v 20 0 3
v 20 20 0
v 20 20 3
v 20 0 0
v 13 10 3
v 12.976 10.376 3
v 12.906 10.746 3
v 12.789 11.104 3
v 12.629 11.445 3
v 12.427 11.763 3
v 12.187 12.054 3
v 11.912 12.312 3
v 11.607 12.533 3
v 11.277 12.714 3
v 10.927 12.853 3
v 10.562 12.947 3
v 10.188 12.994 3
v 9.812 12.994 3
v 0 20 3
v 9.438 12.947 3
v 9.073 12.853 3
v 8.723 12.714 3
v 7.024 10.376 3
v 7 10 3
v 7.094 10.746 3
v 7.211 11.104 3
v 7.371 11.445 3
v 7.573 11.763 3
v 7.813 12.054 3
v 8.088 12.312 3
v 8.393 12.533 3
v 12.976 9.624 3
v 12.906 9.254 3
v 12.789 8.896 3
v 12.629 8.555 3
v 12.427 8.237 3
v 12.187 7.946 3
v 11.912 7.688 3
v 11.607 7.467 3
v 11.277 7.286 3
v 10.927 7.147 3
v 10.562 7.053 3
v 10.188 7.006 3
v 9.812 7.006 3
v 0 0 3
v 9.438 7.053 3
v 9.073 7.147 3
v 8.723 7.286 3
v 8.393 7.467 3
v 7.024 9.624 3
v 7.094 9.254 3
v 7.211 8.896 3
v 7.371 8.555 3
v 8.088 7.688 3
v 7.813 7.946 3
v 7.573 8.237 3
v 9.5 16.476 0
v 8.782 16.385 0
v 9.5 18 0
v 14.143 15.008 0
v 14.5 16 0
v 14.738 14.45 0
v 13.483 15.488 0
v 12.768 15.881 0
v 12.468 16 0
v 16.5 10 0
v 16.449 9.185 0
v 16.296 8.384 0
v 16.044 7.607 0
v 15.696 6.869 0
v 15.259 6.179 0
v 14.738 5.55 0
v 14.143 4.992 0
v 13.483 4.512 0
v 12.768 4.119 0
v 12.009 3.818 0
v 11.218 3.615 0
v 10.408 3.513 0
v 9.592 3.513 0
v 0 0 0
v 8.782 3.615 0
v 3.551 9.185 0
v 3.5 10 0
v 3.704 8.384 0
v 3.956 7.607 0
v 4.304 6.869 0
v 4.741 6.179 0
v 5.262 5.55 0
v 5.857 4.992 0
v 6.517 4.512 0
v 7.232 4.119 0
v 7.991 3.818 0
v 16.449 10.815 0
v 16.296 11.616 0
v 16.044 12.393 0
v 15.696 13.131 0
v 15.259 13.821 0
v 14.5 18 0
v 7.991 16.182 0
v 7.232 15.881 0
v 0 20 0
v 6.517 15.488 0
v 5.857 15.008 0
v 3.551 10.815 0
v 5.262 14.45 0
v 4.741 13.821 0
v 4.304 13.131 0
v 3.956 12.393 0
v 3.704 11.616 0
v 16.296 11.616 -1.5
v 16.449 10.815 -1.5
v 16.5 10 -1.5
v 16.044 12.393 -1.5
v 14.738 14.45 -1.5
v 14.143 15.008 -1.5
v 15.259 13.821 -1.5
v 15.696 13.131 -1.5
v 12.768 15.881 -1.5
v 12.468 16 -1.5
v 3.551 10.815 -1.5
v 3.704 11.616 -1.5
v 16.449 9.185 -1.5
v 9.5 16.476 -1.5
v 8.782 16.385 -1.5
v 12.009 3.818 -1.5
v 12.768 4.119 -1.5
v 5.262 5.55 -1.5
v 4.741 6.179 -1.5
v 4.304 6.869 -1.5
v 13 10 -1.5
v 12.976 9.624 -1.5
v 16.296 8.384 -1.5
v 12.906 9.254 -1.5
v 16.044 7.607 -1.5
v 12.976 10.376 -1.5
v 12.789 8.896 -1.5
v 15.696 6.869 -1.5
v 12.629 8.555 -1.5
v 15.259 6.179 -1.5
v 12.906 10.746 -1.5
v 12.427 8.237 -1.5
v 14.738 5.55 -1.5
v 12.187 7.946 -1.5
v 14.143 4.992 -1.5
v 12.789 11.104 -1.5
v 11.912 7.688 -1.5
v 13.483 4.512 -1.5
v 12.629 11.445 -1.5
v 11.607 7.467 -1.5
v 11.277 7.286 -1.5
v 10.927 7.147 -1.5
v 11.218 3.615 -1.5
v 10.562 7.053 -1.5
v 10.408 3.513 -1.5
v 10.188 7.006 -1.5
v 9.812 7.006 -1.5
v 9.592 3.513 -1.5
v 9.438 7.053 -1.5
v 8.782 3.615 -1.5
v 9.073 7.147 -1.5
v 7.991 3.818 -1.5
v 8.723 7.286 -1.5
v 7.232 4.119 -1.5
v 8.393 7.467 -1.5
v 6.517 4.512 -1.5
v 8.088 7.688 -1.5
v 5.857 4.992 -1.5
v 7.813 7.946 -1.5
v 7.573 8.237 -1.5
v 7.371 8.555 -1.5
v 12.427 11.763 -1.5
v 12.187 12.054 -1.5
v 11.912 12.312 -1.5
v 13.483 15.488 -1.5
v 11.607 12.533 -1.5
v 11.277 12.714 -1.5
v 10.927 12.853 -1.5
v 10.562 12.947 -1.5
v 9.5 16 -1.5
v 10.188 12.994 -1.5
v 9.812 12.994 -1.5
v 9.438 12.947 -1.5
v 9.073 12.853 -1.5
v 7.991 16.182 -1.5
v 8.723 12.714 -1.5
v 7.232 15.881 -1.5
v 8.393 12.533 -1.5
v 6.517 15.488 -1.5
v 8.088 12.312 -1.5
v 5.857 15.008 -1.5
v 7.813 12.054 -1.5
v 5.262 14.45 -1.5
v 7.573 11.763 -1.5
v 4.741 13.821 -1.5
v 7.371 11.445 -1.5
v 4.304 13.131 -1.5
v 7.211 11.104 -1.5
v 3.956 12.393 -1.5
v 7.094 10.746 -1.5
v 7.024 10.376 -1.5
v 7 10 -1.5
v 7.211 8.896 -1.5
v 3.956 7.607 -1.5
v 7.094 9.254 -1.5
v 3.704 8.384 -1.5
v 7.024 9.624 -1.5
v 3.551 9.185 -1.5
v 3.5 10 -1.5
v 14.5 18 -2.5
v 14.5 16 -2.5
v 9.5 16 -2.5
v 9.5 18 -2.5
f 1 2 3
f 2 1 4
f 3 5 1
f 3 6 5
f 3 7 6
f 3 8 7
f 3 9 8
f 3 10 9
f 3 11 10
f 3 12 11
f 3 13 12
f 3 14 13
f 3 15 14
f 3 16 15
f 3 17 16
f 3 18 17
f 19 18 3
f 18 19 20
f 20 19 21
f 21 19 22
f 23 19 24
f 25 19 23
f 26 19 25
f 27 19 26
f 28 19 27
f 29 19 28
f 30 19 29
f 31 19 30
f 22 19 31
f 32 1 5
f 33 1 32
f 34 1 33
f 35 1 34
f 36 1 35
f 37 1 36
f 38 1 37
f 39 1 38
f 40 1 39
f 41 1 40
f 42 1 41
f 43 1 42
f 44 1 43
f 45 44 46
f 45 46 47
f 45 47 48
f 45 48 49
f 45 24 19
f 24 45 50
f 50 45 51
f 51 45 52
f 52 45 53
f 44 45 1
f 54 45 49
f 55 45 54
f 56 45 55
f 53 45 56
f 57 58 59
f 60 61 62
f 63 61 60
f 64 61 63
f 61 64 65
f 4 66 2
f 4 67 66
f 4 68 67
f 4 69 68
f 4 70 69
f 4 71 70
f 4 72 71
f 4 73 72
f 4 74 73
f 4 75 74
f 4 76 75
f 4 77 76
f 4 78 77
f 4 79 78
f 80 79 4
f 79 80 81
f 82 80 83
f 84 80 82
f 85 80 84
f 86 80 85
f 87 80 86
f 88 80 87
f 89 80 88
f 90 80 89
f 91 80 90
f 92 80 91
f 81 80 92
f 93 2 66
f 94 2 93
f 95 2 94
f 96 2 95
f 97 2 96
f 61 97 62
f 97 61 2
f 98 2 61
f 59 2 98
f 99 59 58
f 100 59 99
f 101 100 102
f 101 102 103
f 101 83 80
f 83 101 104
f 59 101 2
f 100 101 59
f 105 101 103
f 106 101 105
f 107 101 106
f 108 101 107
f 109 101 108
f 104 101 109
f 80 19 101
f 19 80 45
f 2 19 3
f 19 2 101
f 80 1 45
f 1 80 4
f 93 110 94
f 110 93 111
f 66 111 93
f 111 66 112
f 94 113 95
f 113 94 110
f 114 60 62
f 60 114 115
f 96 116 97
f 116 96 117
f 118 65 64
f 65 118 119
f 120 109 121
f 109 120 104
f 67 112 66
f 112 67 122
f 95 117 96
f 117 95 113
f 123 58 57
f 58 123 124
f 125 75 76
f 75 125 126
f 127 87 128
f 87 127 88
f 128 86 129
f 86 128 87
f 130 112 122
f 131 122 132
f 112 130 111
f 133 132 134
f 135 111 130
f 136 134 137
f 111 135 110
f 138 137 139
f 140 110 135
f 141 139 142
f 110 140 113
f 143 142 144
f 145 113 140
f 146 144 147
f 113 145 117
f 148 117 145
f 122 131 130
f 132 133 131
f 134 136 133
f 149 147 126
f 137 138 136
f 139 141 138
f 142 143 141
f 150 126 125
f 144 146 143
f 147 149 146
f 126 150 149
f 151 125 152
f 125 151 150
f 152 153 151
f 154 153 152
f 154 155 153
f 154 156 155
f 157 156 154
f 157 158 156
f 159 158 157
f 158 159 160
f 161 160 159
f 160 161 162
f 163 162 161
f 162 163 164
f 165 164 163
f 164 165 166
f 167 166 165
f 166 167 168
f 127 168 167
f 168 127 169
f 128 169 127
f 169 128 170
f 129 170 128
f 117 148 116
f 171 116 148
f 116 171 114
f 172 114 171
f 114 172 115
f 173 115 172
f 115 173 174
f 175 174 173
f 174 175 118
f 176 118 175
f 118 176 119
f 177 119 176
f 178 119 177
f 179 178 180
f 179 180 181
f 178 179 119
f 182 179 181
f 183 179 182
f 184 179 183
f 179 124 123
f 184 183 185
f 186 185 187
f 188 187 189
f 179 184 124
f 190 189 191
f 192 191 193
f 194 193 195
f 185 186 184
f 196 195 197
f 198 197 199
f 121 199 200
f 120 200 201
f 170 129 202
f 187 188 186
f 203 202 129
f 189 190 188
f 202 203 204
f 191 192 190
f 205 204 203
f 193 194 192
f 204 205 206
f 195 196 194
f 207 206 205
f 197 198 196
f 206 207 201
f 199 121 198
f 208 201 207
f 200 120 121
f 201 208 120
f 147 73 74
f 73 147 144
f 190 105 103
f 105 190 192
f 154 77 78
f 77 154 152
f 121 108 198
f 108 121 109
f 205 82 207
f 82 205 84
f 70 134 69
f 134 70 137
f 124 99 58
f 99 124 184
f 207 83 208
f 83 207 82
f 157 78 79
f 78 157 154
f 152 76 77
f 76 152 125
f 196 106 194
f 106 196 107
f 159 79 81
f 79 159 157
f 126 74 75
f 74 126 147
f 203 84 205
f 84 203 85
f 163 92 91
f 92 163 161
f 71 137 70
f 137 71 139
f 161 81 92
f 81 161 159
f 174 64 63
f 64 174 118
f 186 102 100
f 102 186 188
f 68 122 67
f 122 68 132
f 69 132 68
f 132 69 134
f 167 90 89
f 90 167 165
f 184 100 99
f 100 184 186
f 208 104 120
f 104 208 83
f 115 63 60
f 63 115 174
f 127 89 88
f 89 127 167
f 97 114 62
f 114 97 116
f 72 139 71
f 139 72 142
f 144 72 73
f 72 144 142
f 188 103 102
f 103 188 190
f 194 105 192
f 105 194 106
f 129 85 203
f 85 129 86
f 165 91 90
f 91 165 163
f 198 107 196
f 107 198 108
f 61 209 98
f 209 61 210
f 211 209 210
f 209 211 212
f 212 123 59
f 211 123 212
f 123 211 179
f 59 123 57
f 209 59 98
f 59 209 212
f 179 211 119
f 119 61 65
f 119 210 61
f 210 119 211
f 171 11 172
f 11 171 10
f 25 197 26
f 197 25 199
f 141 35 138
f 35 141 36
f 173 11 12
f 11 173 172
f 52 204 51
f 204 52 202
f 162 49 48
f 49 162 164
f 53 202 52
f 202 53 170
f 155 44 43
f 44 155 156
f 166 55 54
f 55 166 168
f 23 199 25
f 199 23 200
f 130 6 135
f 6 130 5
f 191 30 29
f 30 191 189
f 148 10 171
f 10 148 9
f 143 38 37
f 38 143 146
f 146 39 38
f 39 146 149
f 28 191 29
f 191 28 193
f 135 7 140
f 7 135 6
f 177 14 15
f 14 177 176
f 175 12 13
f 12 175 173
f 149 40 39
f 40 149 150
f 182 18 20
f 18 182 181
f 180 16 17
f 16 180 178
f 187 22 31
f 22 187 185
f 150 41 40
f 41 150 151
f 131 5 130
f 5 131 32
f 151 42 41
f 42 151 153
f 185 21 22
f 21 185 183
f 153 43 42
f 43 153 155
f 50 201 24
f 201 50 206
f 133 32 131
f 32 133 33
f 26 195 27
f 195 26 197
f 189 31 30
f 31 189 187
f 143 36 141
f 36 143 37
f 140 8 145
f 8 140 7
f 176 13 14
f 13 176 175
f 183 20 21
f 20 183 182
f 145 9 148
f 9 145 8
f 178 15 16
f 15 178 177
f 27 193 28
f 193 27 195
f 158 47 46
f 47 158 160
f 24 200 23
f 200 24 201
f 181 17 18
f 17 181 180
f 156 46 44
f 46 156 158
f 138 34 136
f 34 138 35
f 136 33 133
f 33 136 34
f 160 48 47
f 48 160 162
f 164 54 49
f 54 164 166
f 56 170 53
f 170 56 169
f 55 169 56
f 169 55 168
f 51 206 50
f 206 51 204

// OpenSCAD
$fn = 50;

/**
 * A component to hold a MTS switch.  (eg: MTS-103)
 *
 * @param width        width of the component surface (x-axis)
 * @param length       length of the component surface (y-axis)
 * @param height       height of the component surface (z-axis)
 */
module mts(width, length, height) {
  translate([width / 2, length / 2, height / 2]) {
    difference() {
      hole_radius = 3.0;
      sleve_height = 4.5;
      sleve_radius = 6.5;

      union() {
        // surface
        cube([width, length, height], true);
        // sleve
        translate([0, 0, (sleve_height - height) / -2])
          cylinder(h = sleve_height, r = sleve_radius, center = true);
        // tab
        tab_width = 5.0;
        tab_length = 2.0;
        tab_height = sleve_height + 1.0;
        tab_offset = 0.5;
        translate([(tab_width / 2) - tab_offset, 6.0 + (tab_length / 2), (tab_height - height) / -2])
          cube([tab_width, tab_length, tab_height], center = true);
      }

      // hole
      cylinder(h = 7, r = hole_radius, center = true);
    }
  }
}

// Test the component
rows = 1;
columns = 1;

component_length = 20;
component_width = 20;
panel_thickness = 3;

for (i = [0:columns - 1]) {
  for (j = [0:rows - 1]) {
    translate([component_width * i, component_length * j, 0])
      mts(component_width, component_length, panel_thickness);
  }
}
